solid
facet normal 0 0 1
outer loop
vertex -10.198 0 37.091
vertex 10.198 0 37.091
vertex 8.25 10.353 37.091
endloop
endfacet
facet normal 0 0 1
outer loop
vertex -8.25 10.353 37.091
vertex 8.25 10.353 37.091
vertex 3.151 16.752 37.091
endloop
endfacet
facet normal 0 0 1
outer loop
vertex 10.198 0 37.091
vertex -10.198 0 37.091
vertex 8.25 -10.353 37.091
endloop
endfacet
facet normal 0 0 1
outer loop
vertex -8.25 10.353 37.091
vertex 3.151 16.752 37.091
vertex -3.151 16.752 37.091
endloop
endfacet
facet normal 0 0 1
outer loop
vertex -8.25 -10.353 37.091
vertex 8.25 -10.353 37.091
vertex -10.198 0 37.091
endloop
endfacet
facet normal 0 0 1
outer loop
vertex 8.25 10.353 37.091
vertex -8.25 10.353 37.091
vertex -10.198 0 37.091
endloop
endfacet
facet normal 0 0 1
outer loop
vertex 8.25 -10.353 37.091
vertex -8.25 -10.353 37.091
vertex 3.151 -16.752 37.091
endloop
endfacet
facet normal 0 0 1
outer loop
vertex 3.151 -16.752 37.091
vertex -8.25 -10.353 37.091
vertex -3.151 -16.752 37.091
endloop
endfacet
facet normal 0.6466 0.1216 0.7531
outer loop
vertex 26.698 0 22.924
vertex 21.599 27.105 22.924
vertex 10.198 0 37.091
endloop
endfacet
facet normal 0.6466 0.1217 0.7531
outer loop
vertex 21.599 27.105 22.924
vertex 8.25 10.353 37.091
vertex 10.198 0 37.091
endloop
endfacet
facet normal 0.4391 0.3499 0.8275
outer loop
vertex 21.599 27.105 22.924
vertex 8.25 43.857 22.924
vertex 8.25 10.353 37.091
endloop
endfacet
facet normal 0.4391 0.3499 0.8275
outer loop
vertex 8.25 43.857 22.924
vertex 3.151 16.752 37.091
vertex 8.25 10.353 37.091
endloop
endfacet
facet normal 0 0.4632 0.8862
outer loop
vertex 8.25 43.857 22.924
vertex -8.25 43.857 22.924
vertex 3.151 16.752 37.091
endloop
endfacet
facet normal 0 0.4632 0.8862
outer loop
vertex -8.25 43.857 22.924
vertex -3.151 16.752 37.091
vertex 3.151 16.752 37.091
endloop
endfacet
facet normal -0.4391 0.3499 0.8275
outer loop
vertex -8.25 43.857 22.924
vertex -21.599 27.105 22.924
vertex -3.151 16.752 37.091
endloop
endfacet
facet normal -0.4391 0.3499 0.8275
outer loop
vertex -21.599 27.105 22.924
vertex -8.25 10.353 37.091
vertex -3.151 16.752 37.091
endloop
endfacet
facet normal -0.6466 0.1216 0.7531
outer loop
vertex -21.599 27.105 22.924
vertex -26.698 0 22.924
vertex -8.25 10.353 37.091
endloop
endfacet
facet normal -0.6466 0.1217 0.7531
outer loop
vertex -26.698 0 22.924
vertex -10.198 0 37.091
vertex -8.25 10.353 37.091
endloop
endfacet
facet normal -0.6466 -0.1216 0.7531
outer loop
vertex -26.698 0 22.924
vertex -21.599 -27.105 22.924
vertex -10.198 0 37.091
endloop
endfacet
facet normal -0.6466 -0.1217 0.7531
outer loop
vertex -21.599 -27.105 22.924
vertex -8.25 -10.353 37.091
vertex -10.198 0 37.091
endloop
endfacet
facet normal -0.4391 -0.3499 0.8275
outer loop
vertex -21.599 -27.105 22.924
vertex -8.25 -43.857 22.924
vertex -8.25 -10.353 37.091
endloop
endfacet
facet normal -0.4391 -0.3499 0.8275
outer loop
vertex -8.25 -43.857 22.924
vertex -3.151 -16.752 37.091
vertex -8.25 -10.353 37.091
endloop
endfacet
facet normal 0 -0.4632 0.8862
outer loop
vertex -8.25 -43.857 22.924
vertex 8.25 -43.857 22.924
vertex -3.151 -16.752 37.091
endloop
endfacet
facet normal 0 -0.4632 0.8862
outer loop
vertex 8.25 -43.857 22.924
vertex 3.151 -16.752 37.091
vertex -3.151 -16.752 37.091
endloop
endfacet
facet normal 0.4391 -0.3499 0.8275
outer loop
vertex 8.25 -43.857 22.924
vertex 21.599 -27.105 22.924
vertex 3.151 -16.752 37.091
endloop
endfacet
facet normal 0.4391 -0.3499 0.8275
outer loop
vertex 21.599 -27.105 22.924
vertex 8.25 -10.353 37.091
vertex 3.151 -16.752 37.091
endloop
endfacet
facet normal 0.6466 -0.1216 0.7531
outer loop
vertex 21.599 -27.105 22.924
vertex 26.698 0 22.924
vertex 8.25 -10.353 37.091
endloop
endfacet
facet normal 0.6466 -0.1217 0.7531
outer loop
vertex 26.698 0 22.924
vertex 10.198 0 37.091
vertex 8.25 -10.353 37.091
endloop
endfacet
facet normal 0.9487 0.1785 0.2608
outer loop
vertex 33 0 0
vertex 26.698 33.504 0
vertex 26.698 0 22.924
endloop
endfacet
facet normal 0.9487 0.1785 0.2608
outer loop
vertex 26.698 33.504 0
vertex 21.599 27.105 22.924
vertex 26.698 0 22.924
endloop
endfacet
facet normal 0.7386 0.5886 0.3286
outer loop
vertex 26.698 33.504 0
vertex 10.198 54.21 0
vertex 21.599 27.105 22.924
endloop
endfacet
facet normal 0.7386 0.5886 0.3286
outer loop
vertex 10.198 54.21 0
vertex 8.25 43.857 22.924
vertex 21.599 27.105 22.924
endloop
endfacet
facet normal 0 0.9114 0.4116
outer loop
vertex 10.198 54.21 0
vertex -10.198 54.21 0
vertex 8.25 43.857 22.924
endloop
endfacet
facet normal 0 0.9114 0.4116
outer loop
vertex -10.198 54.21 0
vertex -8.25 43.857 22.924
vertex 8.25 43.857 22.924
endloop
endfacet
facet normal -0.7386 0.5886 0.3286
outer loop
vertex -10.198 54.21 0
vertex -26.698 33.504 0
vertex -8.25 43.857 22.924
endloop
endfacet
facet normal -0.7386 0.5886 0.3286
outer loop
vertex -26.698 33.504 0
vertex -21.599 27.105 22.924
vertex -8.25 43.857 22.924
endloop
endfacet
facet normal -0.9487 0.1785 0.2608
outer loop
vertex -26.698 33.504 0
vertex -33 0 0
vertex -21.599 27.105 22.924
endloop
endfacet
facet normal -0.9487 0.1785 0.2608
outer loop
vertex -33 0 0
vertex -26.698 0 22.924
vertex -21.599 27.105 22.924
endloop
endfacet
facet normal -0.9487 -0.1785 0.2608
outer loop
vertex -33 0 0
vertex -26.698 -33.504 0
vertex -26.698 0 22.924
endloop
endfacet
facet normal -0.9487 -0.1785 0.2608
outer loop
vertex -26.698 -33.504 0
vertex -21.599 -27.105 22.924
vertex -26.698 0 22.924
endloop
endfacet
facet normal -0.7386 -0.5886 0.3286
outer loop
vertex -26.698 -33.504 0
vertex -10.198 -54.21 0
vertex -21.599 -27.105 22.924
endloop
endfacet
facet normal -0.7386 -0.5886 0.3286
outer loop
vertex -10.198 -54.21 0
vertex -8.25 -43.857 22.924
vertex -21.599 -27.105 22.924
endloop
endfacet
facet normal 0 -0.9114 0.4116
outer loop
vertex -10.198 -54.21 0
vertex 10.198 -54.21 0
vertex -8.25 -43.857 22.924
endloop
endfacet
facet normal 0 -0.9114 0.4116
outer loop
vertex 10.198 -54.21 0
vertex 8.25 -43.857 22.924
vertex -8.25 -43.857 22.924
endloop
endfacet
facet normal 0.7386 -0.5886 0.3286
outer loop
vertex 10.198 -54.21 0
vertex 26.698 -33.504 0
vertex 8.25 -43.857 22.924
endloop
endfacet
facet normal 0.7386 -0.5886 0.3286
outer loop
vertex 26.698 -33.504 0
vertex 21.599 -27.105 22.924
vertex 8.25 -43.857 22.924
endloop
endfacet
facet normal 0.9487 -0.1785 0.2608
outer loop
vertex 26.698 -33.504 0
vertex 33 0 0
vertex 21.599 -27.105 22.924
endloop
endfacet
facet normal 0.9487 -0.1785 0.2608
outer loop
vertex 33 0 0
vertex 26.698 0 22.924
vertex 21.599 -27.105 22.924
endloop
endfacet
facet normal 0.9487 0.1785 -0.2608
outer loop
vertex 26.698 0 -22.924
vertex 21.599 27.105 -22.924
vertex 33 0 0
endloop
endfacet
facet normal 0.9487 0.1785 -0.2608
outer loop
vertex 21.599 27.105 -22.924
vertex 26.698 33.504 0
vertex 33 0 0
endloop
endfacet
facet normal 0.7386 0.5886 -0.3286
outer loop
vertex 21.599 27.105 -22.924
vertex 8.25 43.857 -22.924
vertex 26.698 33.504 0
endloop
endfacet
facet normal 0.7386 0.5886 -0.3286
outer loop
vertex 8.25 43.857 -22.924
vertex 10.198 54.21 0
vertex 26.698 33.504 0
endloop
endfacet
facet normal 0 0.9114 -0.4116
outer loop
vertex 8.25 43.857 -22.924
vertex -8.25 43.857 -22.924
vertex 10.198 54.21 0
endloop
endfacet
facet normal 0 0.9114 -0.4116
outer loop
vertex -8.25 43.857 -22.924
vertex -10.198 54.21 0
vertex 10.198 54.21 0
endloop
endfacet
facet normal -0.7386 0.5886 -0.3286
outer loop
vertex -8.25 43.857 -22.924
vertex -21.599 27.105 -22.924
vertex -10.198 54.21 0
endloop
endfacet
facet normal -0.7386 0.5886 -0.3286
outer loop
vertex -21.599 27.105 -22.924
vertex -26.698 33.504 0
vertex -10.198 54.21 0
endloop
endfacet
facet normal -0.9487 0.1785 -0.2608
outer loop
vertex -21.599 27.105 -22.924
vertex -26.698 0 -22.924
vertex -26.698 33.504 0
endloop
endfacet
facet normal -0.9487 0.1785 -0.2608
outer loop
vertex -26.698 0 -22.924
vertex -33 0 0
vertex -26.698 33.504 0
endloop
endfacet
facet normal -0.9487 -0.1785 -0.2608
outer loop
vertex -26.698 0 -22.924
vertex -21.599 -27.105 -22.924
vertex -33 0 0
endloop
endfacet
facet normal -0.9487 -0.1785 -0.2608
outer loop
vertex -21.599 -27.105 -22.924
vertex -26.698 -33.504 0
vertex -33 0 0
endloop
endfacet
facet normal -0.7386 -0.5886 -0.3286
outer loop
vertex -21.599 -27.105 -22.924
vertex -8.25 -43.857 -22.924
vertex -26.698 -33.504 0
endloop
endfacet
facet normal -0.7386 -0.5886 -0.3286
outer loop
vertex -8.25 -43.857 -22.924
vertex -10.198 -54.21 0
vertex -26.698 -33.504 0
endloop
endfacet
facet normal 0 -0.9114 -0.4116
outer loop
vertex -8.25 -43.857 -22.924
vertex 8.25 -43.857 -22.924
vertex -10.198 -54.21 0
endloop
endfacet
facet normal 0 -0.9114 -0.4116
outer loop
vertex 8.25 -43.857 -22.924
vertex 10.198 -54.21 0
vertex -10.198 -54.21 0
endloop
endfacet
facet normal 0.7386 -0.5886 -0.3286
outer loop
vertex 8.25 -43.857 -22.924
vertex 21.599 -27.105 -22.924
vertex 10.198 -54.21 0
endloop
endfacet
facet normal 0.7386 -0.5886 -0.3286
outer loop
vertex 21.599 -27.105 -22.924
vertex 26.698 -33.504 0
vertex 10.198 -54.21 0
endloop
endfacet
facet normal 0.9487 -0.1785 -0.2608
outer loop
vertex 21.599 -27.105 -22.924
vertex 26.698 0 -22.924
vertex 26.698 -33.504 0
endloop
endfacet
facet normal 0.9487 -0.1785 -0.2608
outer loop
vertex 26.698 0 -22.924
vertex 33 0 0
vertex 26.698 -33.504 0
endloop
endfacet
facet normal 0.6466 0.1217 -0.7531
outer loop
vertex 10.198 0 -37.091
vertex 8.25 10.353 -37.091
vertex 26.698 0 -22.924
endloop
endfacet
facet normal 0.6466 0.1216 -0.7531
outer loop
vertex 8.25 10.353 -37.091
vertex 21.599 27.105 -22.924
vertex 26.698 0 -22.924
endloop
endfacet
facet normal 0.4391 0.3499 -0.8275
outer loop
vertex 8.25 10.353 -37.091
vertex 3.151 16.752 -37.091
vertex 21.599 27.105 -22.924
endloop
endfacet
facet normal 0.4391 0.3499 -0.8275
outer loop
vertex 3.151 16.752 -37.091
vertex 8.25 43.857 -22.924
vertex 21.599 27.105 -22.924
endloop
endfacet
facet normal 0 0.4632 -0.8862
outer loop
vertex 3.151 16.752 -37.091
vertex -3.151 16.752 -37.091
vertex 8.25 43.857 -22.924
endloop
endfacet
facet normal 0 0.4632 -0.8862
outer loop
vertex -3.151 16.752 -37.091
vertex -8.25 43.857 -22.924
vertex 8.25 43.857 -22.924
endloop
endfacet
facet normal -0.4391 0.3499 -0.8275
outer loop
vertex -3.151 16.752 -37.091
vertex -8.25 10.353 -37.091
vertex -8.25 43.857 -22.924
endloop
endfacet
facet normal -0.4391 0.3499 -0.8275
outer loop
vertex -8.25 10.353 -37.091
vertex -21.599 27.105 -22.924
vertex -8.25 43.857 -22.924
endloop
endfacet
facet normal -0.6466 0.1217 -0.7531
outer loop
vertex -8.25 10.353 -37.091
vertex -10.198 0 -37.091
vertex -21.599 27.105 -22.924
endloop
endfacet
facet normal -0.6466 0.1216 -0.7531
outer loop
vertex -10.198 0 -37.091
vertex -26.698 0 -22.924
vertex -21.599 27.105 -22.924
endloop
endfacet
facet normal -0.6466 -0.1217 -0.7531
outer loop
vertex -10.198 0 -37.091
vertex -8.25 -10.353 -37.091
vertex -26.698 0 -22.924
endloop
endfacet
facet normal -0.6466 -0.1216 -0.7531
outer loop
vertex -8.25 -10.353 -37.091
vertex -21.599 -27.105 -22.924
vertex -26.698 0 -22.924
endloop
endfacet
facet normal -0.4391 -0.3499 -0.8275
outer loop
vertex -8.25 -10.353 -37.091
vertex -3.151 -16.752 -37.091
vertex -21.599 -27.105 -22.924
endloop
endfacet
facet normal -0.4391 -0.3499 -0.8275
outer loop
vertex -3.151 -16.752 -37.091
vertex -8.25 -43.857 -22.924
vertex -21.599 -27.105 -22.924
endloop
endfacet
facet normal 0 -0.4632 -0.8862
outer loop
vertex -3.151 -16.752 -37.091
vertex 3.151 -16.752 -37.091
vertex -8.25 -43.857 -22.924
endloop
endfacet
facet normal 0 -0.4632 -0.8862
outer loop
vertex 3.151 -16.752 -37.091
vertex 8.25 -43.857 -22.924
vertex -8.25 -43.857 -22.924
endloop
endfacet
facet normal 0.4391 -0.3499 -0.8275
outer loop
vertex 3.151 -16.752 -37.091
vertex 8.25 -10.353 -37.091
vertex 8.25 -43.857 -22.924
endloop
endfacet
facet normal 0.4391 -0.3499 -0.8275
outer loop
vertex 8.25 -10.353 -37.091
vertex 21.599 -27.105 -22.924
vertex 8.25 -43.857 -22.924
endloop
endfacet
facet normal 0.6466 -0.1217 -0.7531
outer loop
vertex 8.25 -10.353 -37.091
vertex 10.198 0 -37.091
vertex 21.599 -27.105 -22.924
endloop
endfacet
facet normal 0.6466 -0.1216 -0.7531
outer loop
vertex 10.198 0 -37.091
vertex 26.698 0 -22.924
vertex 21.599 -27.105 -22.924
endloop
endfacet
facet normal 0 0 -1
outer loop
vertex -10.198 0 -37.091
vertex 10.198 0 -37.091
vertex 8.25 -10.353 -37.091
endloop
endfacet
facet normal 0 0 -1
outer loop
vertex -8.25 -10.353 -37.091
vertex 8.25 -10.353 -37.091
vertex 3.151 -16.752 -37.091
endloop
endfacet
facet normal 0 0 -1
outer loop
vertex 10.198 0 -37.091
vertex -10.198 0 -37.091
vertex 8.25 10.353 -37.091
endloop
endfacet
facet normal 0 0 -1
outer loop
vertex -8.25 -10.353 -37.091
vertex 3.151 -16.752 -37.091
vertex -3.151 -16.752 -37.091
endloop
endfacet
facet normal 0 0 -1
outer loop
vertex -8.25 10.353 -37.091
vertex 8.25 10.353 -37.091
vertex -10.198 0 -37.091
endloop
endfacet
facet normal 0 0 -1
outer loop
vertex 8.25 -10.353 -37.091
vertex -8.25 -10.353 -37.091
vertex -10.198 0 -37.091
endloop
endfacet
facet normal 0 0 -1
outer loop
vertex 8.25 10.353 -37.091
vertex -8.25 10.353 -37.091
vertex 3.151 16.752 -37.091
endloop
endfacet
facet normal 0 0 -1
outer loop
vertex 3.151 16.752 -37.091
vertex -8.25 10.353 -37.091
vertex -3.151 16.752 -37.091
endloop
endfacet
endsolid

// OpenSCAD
// Generated by SolidPython 1.0.1 on 2020-07-29 00:46:50


scale(v = [11, 19, 13]) {
	sphere(r = 3);
}
/***********************************************
*********      SolidPython code:      **********
************************************************
 
# import packages: SolidPython
from solid import *
from solid.utils import *
from itertools import chain, combinations, permutations


class Resize:

    def __init__(self, scad_file):
        self.scad_file = scad_file
        #self.scad_file = import_scad(scad_file)
        # cone/cylinder param:
        self.r1 = 0
        self.r2 = 0
        self.h = 0
        # rectangular prism param:
        self.w = 0
        self.l = 0
        # ellipse param:
        self.r = 0

    # import OpenScad code (file name corresponds to shape)


    # classify shape + parameters
    def assign(self, param1, param2, param3):
        if self.scad_file == 'cone.scad':
            self.r1 = param1
            self.r2 = param2
            self.h = param3
        elif self.scad_file == 'cylinder.scad':
            self.r1 = param1
            self.r2 = param2
            self.h = param3
        elif self.scad_file == 'rectangularPrism.scad':
            self.h = param1
            self.l = param2
            self.w = param3
        else:
            self.r = param1
            self.h = param2

    # resize parameters
    def iterate(self):
        x = range(3, 20, 2)
        i = 1
        if self.scad_file == 'cone.scad':
            tempList = list(permutations(x, 2))
            for temp in tempList:
                param1 = temp[0]
                param2 = temp[1]
                filepath = 'produced_scad_files/' + 'cone' + str(param1) + '_' + str(param2) + '_' + '.scad'
                scad_render_to_file(cylinder(h=param1, r1=param2, r2=0), filepath)

        elif self.scad_file == 'cylinder.scad':
            tempList = list(permutations(x, 3))
            for temp in tempList:
                param1 = temp[0]
                param2 = temp[1]
                filepath = 'produced_scad_files/' + 'cylinder' + str(param1) + '_' + str(param2) + '_' + '.scad'
                scad_render_to_file(cylinder(h=param1, r1=param2, r2=param2), filepath)

        elif self.scad_file == 'rectangularPrism.scad':
            tempList = list(permutations(x, 3))
            for temp in tempList:
                param1 = temp[0]
                param2 = temp[1]
                param3 = temp[2]
                filepath = 'produced_scad_files/' + 'rectangularPrism' + str(param1) + '_' + str(param2) + '_' + str(
                    param3) + '.scad'
                scad_render_to_file(cube(size=(param1, param2, param3)), filepath)

        elif self.scad_file == 'ellipse.scad':
            tempList = list(permutations(x, 4))
            for temp in tempList:
                param1 = temp[0]
                param2 = temp[1]
                param3 = temp[2]
                param4 = temp[3]
                filepath = 'produced_scad_files/' + 'ellipse' + str(param1) + '_' + str(param2) + '_' + str(param3) + '_' + str(param4) + '.scad'
                scad_render_to_file(scale([param1, param2, param3])(sphere(r=param4)), filepath)

    def render_to_scadfile(self):
        scad_render_to_file(scad, 'example.scad') 
 
************************************************/
